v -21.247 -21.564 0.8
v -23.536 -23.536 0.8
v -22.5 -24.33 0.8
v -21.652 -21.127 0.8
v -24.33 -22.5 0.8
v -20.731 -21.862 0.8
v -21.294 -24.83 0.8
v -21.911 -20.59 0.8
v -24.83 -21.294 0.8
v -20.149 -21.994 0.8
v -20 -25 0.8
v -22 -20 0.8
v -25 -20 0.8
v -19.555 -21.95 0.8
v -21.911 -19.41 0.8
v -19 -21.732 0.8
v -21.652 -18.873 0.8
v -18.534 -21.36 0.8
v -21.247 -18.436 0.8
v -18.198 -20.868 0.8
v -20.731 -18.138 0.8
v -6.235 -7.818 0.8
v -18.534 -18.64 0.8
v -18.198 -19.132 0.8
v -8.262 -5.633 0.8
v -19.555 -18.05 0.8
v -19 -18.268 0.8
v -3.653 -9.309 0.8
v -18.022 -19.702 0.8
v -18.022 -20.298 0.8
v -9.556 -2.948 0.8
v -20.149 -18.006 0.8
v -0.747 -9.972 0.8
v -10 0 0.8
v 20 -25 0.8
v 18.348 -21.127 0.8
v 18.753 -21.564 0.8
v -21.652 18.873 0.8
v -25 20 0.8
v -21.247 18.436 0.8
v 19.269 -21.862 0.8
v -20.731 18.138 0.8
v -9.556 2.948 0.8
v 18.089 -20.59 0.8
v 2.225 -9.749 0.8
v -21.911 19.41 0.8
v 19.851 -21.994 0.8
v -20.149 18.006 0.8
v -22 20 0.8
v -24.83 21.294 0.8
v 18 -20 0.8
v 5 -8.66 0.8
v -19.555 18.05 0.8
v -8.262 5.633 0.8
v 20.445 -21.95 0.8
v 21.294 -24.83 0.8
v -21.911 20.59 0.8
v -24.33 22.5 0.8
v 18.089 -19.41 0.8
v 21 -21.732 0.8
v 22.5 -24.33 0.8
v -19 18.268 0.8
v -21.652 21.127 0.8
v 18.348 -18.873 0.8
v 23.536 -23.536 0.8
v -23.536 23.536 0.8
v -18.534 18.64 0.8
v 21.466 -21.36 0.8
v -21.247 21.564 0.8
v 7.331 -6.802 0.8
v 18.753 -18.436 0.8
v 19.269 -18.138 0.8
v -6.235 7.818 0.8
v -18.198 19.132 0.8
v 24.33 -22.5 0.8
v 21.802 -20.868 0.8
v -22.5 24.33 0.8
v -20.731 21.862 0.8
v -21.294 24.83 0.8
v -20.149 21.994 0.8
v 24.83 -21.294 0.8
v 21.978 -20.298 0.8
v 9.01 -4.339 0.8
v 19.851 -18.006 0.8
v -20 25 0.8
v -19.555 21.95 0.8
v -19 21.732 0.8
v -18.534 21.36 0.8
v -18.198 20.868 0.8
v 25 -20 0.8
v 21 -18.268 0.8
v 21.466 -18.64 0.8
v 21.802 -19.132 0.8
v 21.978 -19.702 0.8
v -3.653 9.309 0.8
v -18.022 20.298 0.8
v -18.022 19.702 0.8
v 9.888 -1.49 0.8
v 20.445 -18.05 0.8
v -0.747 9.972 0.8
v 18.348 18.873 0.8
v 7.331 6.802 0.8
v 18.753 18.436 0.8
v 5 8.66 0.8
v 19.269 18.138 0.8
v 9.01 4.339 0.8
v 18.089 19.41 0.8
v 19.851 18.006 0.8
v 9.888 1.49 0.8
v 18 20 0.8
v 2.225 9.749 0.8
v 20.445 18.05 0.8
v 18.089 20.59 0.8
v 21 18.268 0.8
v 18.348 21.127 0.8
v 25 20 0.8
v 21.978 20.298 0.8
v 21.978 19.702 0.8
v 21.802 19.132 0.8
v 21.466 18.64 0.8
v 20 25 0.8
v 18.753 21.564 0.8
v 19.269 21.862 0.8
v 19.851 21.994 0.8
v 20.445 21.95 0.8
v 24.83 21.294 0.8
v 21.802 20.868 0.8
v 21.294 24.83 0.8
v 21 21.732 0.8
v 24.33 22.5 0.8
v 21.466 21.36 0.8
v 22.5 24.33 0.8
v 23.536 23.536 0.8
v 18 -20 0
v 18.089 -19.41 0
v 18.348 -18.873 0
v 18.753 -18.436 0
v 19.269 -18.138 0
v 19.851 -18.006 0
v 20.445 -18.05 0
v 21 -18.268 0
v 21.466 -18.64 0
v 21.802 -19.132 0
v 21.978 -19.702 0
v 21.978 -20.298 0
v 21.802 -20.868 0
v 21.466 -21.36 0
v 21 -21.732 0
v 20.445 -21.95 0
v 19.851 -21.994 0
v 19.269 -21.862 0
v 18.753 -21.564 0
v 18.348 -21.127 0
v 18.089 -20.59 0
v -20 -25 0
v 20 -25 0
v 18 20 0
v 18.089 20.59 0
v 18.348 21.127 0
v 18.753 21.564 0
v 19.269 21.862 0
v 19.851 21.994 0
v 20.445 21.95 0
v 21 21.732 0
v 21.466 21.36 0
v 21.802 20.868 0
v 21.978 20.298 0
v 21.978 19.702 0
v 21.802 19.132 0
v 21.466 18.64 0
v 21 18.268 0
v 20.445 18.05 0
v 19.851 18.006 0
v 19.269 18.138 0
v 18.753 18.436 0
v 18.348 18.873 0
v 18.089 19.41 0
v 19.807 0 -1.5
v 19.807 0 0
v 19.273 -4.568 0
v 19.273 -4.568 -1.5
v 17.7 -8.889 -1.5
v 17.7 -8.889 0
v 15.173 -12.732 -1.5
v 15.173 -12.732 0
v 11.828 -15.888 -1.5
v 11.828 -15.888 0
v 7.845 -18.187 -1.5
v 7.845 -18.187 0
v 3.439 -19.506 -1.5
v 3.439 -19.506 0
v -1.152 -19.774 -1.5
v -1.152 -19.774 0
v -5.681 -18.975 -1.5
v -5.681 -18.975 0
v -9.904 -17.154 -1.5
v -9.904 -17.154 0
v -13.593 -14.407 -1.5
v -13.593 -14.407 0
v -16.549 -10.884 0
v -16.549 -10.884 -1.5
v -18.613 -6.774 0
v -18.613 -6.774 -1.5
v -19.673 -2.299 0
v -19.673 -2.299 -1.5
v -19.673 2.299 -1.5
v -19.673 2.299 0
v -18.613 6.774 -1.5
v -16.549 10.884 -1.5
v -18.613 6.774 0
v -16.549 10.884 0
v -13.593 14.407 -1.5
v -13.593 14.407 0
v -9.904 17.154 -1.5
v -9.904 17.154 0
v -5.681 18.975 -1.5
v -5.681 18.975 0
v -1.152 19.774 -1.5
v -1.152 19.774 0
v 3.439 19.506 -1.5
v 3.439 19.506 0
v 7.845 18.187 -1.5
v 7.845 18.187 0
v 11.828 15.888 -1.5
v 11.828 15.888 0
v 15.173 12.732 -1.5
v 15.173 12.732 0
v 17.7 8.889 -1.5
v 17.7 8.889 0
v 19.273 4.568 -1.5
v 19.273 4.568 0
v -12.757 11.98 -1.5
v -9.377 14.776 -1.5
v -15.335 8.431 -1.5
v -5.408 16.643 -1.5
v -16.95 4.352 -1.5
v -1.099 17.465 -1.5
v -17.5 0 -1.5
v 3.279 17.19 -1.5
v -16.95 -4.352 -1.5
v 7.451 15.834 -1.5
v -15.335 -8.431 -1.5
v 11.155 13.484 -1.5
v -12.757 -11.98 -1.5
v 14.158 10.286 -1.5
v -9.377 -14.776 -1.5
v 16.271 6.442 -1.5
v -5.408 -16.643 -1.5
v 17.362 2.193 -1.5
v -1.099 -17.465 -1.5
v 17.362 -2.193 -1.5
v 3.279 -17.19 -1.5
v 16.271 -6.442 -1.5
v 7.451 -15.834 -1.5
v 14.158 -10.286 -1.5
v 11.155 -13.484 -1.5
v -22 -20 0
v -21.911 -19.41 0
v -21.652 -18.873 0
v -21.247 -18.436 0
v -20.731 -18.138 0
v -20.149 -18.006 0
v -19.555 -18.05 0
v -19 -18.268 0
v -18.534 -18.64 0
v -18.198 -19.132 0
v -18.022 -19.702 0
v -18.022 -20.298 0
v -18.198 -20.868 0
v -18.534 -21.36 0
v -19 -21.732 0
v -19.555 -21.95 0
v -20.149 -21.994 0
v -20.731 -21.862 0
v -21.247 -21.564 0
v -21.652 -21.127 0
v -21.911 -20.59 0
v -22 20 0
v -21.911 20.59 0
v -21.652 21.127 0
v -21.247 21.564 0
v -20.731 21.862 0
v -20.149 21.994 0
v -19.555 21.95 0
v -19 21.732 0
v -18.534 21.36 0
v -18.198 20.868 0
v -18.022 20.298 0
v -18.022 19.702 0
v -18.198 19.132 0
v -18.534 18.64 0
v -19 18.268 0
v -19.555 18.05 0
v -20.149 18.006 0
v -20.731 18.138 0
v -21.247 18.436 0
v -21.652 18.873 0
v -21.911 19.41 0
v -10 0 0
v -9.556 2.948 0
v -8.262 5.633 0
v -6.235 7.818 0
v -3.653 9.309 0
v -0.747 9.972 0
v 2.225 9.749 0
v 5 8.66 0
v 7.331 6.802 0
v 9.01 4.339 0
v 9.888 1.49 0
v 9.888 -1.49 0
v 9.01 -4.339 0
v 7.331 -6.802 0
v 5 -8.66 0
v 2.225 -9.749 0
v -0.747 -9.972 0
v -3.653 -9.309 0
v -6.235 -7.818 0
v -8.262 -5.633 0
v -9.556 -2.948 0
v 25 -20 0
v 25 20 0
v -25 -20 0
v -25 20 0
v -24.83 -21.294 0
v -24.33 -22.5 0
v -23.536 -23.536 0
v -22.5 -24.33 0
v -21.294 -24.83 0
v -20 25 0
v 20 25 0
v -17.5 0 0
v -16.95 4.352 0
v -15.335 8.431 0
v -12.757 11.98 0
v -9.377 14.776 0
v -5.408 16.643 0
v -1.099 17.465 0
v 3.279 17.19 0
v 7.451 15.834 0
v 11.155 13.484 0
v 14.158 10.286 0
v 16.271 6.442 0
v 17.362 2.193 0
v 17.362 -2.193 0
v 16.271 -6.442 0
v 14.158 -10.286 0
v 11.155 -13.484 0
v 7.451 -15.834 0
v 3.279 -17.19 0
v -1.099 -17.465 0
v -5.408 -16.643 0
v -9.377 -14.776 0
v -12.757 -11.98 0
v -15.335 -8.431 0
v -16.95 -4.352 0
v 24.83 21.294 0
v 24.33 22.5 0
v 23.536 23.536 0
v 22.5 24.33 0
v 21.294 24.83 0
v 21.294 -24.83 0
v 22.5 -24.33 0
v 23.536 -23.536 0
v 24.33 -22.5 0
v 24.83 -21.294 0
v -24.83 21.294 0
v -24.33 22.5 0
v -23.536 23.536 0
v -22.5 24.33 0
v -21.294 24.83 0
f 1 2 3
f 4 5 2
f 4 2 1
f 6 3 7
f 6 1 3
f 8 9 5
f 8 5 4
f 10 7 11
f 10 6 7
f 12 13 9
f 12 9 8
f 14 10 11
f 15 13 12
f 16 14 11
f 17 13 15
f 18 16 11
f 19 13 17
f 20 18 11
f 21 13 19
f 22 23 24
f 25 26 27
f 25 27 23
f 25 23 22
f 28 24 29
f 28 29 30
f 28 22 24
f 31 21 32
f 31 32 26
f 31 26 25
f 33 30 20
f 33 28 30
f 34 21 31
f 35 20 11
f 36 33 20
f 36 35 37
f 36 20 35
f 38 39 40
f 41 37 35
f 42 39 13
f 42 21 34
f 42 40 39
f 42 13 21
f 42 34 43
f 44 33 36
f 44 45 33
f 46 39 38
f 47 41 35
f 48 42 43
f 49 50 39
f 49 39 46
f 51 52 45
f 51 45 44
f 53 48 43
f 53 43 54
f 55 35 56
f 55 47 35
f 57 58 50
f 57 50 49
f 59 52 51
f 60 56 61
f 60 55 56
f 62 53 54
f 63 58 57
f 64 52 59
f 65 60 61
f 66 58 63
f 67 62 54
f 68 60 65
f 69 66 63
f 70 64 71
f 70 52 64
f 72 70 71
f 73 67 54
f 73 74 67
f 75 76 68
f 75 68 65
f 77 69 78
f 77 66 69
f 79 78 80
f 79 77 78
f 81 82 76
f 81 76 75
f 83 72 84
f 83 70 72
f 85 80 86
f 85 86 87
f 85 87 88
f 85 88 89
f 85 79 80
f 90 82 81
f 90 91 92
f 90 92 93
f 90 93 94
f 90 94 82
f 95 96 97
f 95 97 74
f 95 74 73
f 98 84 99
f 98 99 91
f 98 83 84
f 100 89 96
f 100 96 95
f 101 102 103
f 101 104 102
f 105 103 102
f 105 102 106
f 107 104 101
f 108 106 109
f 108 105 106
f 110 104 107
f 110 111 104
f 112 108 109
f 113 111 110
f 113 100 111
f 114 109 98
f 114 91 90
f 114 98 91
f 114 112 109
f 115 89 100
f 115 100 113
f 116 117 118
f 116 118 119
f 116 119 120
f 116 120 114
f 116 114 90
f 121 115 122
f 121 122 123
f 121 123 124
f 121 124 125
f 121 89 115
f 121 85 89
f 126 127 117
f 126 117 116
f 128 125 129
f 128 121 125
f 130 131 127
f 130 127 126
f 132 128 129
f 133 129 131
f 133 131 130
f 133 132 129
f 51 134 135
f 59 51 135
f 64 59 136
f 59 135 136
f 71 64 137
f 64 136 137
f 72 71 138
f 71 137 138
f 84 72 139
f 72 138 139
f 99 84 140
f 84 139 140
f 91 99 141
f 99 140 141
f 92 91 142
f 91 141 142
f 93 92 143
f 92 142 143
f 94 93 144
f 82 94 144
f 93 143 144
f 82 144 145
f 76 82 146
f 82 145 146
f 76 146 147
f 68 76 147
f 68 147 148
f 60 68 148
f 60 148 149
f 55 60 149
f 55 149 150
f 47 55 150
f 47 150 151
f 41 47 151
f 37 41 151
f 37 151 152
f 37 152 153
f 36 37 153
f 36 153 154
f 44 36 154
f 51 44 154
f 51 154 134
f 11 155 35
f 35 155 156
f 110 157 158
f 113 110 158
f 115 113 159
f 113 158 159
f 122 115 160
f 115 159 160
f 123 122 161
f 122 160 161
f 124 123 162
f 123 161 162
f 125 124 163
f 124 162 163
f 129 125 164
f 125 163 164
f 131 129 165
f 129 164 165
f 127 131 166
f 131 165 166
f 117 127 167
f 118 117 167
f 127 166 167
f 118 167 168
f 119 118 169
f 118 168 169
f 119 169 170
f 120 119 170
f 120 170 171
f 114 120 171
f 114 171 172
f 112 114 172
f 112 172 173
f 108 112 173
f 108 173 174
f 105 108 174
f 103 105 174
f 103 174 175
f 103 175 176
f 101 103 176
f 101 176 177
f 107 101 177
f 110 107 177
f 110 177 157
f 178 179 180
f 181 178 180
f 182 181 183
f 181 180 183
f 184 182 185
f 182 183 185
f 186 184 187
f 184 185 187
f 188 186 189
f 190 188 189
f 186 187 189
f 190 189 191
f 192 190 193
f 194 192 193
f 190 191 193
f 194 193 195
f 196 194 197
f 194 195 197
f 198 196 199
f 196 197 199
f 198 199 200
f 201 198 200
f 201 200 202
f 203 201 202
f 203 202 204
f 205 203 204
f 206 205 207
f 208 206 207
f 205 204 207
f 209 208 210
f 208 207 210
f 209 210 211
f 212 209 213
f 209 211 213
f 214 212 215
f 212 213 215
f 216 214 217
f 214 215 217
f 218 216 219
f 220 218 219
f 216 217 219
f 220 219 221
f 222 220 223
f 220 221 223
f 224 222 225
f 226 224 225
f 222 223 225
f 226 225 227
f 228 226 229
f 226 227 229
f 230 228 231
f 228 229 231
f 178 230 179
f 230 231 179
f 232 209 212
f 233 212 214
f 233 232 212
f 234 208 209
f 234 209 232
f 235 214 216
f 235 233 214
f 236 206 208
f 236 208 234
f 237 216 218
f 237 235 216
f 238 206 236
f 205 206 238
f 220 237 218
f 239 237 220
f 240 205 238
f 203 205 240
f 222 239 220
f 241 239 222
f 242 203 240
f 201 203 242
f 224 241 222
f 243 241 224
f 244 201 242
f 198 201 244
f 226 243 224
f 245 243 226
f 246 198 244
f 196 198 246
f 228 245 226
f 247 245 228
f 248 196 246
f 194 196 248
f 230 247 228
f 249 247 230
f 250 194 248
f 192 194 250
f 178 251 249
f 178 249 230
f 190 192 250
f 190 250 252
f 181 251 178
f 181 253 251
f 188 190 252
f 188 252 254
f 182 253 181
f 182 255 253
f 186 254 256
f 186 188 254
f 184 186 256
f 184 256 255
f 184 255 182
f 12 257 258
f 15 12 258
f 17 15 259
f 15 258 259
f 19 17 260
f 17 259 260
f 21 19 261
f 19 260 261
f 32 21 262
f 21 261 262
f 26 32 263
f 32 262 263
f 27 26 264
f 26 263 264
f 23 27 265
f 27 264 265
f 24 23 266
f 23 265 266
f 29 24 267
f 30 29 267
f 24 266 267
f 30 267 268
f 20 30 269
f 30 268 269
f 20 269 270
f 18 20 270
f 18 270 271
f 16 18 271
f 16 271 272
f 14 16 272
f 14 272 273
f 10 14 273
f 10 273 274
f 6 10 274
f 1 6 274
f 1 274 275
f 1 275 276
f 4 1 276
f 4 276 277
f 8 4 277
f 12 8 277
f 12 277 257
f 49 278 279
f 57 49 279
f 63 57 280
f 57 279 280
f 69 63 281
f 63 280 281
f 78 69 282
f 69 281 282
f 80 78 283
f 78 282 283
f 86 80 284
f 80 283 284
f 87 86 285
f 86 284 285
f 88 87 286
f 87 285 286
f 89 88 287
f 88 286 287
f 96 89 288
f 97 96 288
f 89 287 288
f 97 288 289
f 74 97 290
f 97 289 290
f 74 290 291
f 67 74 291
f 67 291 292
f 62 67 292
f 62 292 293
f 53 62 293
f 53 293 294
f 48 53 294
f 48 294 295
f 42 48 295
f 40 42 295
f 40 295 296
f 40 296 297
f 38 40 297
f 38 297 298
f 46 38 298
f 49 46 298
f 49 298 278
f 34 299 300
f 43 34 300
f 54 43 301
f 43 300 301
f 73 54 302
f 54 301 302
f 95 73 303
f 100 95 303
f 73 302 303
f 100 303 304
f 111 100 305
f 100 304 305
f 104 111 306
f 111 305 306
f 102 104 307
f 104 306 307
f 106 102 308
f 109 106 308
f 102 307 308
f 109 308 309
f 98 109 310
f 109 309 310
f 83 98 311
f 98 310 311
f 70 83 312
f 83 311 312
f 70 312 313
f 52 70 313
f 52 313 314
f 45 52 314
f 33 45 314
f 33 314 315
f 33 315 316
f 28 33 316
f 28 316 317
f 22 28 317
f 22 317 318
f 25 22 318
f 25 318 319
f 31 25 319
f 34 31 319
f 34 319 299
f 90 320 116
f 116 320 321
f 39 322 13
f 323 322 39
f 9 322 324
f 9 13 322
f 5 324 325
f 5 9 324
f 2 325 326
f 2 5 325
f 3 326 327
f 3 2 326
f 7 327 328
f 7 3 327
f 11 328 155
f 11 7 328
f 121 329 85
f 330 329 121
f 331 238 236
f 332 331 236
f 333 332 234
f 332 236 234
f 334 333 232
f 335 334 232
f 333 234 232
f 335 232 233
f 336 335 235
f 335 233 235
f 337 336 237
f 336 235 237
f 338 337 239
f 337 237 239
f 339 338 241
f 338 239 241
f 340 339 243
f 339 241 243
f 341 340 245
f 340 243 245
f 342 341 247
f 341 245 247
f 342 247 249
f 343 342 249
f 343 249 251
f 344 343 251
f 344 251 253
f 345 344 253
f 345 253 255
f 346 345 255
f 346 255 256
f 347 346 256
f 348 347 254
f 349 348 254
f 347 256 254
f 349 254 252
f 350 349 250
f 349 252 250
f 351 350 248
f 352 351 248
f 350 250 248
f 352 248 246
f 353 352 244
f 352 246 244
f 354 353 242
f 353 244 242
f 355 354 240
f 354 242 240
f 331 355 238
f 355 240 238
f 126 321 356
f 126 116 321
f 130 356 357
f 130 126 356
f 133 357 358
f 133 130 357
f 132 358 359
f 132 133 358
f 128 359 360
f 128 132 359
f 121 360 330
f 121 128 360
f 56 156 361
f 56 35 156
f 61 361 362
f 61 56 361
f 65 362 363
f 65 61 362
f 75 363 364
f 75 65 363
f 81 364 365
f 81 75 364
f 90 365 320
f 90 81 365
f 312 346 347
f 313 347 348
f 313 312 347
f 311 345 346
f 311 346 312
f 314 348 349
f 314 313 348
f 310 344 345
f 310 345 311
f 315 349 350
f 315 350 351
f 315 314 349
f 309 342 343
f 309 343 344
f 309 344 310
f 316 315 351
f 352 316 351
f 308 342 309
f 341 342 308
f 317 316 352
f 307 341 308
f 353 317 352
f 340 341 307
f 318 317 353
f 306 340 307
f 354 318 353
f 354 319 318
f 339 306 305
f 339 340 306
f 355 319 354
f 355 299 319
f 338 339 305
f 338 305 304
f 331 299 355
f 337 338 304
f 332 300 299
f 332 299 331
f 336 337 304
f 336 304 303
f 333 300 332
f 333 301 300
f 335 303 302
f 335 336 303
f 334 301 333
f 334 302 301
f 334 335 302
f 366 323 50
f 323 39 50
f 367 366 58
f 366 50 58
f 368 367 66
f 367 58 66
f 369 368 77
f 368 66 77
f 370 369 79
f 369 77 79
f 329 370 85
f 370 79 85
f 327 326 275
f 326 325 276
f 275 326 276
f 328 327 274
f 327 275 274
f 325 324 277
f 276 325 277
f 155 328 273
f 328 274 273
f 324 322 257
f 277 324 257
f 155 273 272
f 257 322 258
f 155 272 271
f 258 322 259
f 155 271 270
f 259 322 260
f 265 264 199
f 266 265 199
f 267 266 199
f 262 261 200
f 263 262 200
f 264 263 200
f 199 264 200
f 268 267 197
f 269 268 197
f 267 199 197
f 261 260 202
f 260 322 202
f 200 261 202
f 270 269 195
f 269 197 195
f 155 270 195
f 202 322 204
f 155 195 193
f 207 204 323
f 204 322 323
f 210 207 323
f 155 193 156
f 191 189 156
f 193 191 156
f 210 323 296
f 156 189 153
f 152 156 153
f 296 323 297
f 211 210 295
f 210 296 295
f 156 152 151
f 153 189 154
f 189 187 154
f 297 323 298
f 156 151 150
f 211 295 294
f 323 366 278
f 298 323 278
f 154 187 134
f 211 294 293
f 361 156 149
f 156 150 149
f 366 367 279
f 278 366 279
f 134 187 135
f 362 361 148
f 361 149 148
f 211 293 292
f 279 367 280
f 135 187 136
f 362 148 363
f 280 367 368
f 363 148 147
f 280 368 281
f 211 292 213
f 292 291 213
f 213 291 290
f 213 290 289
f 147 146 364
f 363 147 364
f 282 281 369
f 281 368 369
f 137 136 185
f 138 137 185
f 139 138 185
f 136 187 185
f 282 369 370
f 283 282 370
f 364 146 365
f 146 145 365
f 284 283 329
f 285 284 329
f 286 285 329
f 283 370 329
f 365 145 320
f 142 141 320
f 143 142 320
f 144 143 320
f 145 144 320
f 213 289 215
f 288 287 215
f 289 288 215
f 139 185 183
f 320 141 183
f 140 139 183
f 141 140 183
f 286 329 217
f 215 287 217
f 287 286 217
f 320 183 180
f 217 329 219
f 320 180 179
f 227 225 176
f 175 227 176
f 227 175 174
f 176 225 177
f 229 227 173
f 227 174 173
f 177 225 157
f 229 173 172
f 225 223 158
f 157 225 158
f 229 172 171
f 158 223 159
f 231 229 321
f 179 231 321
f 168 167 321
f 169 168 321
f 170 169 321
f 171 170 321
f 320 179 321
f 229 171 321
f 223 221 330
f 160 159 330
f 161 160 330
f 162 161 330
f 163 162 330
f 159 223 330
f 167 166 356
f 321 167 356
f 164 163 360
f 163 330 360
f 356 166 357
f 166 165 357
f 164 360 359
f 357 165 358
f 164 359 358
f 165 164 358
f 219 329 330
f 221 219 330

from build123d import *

# Parameters (mm, degrees)
SKETCH1_W           = 50
SKETCH1_H           = 50
BOSS_EXTRUDE1_DEPTH = 0.8
FILLET1_R           = 5
SKETCH2_R           = 2
CUT_EXTRUDE1_DEPTH  = 36.364388868
SKETCH3_R           = 19.807187389
BOSS_EXTRUDE2_DEPTH = 1.5
SKETCH4_R           = 17.5
CUT_EXTRUDE2_DEPTH  = 1.5
SKETCH6_R           = 10
CUT_EXTRUDE3_DEPTH  = 36.387144558


with BuildPart() as part:
    # Sketch1 → Boss-Extrude1 (new body)
    with BuildSketch(Plane.XY):
        Rectangle(SKETCH1_W, SKETCH1_H)
    extrude(amount=BOSS_EXTRUDE1_DEPTH)

    # Fillet1
    fillet1_edges = [part.edges().sort_by_distance(p)[0] for p in [
        (25, -25, 0.4),
        (-25, -25, 0.4),
        (-25, 25, 0.4),
        (25, 25, 0.4),
    ]]
    fillet(fillet1_edges, radius=FILLET1_R)

    # Sketch2 → Cut-Extrude1 (cut, through all)
    with BuildSketch(Plane(origin=(0, 0, 0), x_dir=(-1, 0, 0), z_dir=(0, 0, -1))):
        with Locations((-20, 20)):
            Circle(SKETCH2_R)
        with Locations((20, 20)):
            Circle(SKETCH2_R)
        with Locations((20, -20)):
            Circle(SKETCH2_R)
        with Locations((-20, -20)):
            Circle(SKETCH2_R)
    extrude(amount=-CUT_EXTRUDE1_DEPTH, mode=Mode.SUBTRACT)

    # Sketch3 → Boss-Extrude2 (add)
    with BuildSketch(Plane(origin=(0, 0, 0), x_dir=(-1, 0, 0), z_dir=(0, 0, -1))):
        with Locations(Location((0, 0, 0), (0, 0, 180))):
            Circle(SKETCH3_R)
    extrude(amount=BOSS_EXTRUDE2_DEPTH)

    # Sketch4 → Cut-Extrude2 (cut)
    with BuildSketch(Plane(origin=(0, 0, -1.5), x_dir=(-1, 0, 0), z_dir=(0, 0, -1))):
        Circle(SKETCH4_R)
    extrude(amount=-CUT_EXTRUDE2_DEPTH, mode=Mode.SUBTRACT)

    # Sketch6 → Cut-Extrude3 (cut, through all)
    with BuildSketch(Plane(origin=(0, 0, 0), x_dir=(-1, 0, 0), z_dir=(0, 0, -1))):
        Circle(SKETCH6_R)
    extrude(amount=-CUT_EXTRUDE3_DEPTH, mode=Mode.SUBTRACT)


solid = part.part
